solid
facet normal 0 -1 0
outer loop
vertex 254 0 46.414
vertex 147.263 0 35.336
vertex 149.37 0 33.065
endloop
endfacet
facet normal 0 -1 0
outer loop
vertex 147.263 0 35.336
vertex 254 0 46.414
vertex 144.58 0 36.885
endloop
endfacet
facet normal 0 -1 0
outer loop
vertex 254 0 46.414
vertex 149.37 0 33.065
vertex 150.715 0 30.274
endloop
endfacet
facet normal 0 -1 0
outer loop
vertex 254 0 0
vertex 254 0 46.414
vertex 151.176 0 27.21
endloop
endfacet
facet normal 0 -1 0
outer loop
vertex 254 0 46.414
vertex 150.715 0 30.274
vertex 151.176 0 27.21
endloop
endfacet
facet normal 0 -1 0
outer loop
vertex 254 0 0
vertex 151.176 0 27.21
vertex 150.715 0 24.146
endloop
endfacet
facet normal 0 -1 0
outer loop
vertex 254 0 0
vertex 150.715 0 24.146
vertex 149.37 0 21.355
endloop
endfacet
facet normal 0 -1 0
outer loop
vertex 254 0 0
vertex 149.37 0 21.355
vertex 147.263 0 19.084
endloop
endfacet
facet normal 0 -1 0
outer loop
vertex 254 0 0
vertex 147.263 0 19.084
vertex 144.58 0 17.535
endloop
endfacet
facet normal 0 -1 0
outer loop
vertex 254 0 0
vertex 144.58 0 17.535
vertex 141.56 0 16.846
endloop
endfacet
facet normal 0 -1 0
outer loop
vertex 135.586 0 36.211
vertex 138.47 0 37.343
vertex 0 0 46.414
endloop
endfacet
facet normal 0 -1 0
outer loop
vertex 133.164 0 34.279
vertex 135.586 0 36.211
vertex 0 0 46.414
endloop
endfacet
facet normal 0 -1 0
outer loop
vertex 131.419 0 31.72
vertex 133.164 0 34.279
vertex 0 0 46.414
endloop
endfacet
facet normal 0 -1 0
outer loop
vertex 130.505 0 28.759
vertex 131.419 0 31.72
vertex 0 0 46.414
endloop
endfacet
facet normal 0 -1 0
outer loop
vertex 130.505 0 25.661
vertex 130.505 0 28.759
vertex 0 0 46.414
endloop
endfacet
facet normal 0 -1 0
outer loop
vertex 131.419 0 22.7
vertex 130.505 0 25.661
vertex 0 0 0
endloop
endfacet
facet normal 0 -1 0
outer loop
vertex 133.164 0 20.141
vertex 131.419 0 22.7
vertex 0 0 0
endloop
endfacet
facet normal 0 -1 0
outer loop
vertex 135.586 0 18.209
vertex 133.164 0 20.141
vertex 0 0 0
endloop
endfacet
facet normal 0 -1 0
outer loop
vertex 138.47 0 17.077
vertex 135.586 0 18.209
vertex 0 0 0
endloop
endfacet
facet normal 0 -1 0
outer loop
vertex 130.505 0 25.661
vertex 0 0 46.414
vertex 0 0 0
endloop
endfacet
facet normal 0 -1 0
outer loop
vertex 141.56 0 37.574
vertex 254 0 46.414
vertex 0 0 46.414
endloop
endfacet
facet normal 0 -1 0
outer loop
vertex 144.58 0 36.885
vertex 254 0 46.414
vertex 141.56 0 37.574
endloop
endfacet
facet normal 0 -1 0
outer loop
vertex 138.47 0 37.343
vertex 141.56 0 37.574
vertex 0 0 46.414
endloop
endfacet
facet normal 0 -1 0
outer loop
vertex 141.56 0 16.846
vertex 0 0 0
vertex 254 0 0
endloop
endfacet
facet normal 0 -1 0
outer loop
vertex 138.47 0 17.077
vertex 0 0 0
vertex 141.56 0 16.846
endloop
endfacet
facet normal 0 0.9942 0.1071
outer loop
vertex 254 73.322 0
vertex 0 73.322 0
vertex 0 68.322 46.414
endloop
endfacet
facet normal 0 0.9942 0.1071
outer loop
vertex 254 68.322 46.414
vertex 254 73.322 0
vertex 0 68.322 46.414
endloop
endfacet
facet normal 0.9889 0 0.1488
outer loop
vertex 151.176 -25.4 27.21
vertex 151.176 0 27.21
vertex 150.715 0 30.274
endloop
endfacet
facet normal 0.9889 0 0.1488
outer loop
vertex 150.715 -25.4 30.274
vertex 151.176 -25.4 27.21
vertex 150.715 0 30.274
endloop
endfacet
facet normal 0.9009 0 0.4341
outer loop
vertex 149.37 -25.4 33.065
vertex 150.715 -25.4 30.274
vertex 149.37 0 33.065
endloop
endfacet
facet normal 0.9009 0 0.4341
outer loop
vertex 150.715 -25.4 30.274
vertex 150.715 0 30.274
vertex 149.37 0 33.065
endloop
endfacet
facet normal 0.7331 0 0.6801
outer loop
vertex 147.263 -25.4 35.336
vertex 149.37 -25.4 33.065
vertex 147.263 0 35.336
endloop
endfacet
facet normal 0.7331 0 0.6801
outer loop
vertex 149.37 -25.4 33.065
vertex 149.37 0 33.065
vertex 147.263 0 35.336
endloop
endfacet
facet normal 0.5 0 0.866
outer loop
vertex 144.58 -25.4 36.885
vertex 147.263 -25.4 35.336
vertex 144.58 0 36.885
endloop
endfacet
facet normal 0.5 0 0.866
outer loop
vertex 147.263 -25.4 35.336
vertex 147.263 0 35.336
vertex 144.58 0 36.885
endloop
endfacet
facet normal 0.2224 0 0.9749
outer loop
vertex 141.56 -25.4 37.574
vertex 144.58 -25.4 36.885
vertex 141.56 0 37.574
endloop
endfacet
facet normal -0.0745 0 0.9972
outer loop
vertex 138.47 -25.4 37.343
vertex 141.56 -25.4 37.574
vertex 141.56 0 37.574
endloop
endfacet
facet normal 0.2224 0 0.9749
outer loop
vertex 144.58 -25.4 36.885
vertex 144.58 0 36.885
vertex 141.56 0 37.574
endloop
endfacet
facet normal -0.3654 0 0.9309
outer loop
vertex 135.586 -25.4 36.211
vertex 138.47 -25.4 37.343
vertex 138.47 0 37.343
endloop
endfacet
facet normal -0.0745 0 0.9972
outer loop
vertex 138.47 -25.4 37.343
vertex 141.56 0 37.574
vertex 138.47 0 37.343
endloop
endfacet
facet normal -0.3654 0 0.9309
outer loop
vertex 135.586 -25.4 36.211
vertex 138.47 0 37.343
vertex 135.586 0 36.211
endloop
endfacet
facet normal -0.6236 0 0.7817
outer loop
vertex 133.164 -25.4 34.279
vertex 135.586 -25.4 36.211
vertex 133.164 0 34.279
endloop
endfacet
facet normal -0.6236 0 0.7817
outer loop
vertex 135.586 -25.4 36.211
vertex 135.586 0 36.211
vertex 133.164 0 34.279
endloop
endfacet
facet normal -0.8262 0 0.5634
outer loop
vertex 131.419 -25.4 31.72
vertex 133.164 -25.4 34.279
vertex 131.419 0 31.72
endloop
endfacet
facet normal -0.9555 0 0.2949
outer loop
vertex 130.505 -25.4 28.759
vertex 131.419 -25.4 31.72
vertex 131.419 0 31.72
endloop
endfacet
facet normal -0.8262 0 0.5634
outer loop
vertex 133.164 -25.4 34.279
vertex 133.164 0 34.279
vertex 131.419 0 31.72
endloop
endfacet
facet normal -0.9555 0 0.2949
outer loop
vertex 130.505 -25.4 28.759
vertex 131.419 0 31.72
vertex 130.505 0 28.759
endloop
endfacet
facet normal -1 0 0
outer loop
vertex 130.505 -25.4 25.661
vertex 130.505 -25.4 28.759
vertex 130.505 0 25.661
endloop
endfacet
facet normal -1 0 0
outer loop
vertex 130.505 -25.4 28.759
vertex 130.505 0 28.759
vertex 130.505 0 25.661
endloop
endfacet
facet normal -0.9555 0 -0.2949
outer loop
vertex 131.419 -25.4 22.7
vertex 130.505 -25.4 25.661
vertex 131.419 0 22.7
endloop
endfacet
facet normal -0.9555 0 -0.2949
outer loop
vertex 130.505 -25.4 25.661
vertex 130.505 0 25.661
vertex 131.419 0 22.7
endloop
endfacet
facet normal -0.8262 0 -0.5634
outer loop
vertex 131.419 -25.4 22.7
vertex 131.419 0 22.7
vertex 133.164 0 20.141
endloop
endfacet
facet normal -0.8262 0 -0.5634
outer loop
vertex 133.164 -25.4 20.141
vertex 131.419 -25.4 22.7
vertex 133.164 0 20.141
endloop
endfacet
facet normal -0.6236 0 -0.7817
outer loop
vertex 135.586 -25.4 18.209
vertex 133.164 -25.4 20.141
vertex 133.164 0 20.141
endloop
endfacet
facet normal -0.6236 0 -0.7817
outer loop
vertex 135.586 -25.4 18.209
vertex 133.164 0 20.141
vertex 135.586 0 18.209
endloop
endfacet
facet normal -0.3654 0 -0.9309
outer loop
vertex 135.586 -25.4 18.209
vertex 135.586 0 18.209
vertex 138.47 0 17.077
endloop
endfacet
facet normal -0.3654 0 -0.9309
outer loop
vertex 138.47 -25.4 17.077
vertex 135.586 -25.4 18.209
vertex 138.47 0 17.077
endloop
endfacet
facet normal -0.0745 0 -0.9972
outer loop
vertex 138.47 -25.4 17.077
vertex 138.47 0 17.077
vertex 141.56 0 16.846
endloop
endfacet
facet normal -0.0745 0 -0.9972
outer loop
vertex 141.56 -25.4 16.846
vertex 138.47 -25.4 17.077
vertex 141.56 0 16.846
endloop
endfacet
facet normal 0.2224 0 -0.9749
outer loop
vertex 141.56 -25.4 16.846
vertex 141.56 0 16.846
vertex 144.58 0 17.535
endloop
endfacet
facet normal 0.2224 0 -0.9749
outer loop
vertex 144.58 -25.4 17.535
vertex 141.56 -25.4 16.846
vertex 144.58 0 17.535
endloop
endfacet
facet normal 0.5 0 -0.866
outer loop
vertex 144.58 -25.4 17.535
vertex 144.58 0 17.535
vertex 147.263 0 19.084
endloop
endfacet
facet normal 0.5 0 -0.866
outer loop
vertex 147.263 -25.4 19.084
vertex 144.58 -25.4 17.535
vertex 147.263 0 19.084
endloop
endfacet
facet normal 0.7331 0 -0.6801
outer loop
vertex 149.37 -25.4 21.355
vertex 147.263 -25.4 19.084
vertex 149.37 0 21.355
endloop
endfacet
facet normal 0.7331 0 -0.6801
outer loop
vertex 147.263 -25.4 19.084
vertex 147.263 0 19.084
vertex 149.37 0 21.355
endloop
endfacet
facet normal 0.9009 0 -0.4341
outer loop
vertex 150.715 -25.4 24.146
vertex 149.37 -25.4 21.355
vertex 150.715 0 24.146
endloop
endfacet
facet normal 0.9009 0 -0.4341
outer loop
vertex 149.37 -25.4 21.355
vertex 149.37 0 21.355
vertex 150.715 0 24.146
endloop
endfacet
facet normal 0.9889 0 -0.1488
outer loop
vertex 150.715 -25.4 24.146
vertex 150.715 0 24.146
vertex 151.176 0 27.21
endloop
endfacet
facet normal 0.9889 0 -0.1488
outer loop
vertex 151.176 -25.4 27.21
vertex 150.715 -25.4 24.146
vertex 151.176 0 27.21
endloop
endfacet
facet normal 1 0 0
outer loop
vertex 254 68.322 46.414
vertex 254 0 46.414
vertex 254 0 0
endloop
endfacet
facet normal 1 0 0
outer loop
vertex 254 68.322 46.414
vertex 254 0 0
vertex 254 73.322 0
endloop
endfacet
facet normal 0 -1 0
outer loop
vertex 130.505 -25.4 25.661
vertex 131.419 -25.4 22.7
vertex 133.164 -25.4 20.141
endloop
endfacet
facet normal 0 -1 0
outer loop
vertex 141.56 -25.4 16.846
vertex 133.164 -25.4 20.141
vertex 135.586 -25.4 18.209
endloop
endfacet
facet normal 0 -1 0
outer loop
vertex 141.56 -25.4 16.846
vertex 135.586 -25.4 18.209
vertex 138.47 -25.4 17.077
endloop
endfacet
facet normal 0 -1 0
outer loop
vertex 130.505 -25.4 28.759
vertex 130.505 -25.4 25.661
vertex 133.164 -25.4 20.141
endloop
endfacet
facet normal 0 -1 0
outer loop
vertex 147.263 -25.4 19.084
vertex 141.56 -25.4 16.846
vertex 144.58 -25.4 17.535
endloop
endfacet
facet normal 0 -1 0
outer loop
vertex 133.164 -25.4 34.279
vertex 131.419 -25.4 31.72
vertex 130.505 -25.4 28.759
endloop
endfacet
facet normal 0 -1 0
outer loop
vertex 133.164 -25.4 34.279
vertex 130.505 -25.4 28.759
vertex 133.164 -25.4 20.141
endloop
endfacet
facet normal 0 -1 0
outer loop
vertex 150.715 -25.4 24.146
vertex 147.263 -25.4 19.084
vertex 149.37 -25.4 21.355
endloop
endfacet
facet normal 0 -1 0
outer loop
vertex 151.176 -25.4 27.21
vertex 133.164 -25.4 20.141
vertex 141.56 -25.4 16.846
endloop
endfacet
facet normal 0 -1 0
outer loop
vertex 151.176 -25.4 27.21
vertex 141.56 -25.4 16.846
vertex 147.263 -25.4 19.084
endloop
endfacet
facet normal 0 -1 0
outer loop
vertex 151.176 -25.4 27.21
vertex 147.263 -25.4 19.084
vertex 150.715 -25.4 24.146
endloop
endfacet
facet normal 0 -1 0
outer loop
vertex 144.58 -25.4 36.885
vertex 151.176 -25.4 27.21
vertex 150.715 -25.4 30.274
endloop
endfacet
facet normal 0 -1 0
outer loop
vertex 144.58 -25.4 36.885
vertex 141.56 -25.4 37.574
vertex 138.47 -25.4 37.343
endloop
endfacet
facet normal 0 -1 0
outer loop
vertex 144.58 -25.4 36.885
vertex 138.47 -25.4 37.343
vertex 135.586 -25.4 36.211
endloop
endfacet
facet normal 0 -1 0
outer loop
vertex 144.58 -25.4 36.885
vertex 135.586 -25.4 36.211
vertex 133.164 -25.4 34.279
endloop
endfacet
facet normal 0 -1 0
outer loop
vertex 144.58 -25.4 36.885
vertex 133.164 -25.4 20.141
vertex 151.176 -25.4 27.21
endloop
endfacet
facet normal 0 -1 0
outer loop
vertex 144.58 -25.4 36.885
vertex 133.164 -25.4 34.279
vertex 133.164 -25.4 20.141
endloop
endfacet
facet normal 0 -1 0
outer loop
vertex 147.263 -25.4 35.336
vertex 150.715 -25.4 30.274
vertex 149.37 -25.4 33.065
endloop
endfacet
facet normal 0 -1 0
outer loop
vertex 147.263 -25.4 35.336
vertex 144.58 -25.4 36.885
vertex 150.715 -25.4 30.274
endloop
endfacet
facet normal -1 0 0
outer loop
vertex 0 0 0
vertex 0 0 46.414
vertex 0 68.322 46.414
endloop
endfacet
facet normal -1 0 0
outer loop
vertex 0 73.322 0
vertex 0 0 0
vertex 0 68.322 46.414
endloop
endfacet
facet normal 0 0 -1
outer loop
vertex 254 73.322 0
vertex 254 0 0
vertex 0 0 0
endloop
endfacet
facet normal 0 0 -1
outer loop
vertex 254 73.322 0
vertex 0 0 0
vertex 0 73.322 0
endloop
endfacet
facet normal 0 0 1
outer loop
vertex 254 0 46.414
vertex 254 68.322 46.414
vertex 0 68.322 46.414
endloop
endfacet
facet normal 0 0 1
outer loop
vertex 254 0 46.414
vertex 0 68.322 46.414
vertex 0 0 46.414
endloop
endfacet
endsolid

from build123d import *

# Parameters (mm, degrees)
F1_DEPTH = 254
F2_R     = 10.393526
F3_DEPTH = 25.4


with BuildPart() as f1:
    # F0 (on Right) → F1 (new body)
    with BuildSketch(Plane.YZ):
        Polygon((73.321618, 0), (68.32242, 46.414401), (0, 46.414401), (0, 0), align=None)
    extrude(amount=F1_DEPTH)

    # F2 (on face) → F3 (join)
    with BuildSketch(Plane.XZ):
        with Locations((140.782937, 27.210025)):
            Circle(F2_R)
    extrude(amount=F3_DEPTH)


solid = f1.part
